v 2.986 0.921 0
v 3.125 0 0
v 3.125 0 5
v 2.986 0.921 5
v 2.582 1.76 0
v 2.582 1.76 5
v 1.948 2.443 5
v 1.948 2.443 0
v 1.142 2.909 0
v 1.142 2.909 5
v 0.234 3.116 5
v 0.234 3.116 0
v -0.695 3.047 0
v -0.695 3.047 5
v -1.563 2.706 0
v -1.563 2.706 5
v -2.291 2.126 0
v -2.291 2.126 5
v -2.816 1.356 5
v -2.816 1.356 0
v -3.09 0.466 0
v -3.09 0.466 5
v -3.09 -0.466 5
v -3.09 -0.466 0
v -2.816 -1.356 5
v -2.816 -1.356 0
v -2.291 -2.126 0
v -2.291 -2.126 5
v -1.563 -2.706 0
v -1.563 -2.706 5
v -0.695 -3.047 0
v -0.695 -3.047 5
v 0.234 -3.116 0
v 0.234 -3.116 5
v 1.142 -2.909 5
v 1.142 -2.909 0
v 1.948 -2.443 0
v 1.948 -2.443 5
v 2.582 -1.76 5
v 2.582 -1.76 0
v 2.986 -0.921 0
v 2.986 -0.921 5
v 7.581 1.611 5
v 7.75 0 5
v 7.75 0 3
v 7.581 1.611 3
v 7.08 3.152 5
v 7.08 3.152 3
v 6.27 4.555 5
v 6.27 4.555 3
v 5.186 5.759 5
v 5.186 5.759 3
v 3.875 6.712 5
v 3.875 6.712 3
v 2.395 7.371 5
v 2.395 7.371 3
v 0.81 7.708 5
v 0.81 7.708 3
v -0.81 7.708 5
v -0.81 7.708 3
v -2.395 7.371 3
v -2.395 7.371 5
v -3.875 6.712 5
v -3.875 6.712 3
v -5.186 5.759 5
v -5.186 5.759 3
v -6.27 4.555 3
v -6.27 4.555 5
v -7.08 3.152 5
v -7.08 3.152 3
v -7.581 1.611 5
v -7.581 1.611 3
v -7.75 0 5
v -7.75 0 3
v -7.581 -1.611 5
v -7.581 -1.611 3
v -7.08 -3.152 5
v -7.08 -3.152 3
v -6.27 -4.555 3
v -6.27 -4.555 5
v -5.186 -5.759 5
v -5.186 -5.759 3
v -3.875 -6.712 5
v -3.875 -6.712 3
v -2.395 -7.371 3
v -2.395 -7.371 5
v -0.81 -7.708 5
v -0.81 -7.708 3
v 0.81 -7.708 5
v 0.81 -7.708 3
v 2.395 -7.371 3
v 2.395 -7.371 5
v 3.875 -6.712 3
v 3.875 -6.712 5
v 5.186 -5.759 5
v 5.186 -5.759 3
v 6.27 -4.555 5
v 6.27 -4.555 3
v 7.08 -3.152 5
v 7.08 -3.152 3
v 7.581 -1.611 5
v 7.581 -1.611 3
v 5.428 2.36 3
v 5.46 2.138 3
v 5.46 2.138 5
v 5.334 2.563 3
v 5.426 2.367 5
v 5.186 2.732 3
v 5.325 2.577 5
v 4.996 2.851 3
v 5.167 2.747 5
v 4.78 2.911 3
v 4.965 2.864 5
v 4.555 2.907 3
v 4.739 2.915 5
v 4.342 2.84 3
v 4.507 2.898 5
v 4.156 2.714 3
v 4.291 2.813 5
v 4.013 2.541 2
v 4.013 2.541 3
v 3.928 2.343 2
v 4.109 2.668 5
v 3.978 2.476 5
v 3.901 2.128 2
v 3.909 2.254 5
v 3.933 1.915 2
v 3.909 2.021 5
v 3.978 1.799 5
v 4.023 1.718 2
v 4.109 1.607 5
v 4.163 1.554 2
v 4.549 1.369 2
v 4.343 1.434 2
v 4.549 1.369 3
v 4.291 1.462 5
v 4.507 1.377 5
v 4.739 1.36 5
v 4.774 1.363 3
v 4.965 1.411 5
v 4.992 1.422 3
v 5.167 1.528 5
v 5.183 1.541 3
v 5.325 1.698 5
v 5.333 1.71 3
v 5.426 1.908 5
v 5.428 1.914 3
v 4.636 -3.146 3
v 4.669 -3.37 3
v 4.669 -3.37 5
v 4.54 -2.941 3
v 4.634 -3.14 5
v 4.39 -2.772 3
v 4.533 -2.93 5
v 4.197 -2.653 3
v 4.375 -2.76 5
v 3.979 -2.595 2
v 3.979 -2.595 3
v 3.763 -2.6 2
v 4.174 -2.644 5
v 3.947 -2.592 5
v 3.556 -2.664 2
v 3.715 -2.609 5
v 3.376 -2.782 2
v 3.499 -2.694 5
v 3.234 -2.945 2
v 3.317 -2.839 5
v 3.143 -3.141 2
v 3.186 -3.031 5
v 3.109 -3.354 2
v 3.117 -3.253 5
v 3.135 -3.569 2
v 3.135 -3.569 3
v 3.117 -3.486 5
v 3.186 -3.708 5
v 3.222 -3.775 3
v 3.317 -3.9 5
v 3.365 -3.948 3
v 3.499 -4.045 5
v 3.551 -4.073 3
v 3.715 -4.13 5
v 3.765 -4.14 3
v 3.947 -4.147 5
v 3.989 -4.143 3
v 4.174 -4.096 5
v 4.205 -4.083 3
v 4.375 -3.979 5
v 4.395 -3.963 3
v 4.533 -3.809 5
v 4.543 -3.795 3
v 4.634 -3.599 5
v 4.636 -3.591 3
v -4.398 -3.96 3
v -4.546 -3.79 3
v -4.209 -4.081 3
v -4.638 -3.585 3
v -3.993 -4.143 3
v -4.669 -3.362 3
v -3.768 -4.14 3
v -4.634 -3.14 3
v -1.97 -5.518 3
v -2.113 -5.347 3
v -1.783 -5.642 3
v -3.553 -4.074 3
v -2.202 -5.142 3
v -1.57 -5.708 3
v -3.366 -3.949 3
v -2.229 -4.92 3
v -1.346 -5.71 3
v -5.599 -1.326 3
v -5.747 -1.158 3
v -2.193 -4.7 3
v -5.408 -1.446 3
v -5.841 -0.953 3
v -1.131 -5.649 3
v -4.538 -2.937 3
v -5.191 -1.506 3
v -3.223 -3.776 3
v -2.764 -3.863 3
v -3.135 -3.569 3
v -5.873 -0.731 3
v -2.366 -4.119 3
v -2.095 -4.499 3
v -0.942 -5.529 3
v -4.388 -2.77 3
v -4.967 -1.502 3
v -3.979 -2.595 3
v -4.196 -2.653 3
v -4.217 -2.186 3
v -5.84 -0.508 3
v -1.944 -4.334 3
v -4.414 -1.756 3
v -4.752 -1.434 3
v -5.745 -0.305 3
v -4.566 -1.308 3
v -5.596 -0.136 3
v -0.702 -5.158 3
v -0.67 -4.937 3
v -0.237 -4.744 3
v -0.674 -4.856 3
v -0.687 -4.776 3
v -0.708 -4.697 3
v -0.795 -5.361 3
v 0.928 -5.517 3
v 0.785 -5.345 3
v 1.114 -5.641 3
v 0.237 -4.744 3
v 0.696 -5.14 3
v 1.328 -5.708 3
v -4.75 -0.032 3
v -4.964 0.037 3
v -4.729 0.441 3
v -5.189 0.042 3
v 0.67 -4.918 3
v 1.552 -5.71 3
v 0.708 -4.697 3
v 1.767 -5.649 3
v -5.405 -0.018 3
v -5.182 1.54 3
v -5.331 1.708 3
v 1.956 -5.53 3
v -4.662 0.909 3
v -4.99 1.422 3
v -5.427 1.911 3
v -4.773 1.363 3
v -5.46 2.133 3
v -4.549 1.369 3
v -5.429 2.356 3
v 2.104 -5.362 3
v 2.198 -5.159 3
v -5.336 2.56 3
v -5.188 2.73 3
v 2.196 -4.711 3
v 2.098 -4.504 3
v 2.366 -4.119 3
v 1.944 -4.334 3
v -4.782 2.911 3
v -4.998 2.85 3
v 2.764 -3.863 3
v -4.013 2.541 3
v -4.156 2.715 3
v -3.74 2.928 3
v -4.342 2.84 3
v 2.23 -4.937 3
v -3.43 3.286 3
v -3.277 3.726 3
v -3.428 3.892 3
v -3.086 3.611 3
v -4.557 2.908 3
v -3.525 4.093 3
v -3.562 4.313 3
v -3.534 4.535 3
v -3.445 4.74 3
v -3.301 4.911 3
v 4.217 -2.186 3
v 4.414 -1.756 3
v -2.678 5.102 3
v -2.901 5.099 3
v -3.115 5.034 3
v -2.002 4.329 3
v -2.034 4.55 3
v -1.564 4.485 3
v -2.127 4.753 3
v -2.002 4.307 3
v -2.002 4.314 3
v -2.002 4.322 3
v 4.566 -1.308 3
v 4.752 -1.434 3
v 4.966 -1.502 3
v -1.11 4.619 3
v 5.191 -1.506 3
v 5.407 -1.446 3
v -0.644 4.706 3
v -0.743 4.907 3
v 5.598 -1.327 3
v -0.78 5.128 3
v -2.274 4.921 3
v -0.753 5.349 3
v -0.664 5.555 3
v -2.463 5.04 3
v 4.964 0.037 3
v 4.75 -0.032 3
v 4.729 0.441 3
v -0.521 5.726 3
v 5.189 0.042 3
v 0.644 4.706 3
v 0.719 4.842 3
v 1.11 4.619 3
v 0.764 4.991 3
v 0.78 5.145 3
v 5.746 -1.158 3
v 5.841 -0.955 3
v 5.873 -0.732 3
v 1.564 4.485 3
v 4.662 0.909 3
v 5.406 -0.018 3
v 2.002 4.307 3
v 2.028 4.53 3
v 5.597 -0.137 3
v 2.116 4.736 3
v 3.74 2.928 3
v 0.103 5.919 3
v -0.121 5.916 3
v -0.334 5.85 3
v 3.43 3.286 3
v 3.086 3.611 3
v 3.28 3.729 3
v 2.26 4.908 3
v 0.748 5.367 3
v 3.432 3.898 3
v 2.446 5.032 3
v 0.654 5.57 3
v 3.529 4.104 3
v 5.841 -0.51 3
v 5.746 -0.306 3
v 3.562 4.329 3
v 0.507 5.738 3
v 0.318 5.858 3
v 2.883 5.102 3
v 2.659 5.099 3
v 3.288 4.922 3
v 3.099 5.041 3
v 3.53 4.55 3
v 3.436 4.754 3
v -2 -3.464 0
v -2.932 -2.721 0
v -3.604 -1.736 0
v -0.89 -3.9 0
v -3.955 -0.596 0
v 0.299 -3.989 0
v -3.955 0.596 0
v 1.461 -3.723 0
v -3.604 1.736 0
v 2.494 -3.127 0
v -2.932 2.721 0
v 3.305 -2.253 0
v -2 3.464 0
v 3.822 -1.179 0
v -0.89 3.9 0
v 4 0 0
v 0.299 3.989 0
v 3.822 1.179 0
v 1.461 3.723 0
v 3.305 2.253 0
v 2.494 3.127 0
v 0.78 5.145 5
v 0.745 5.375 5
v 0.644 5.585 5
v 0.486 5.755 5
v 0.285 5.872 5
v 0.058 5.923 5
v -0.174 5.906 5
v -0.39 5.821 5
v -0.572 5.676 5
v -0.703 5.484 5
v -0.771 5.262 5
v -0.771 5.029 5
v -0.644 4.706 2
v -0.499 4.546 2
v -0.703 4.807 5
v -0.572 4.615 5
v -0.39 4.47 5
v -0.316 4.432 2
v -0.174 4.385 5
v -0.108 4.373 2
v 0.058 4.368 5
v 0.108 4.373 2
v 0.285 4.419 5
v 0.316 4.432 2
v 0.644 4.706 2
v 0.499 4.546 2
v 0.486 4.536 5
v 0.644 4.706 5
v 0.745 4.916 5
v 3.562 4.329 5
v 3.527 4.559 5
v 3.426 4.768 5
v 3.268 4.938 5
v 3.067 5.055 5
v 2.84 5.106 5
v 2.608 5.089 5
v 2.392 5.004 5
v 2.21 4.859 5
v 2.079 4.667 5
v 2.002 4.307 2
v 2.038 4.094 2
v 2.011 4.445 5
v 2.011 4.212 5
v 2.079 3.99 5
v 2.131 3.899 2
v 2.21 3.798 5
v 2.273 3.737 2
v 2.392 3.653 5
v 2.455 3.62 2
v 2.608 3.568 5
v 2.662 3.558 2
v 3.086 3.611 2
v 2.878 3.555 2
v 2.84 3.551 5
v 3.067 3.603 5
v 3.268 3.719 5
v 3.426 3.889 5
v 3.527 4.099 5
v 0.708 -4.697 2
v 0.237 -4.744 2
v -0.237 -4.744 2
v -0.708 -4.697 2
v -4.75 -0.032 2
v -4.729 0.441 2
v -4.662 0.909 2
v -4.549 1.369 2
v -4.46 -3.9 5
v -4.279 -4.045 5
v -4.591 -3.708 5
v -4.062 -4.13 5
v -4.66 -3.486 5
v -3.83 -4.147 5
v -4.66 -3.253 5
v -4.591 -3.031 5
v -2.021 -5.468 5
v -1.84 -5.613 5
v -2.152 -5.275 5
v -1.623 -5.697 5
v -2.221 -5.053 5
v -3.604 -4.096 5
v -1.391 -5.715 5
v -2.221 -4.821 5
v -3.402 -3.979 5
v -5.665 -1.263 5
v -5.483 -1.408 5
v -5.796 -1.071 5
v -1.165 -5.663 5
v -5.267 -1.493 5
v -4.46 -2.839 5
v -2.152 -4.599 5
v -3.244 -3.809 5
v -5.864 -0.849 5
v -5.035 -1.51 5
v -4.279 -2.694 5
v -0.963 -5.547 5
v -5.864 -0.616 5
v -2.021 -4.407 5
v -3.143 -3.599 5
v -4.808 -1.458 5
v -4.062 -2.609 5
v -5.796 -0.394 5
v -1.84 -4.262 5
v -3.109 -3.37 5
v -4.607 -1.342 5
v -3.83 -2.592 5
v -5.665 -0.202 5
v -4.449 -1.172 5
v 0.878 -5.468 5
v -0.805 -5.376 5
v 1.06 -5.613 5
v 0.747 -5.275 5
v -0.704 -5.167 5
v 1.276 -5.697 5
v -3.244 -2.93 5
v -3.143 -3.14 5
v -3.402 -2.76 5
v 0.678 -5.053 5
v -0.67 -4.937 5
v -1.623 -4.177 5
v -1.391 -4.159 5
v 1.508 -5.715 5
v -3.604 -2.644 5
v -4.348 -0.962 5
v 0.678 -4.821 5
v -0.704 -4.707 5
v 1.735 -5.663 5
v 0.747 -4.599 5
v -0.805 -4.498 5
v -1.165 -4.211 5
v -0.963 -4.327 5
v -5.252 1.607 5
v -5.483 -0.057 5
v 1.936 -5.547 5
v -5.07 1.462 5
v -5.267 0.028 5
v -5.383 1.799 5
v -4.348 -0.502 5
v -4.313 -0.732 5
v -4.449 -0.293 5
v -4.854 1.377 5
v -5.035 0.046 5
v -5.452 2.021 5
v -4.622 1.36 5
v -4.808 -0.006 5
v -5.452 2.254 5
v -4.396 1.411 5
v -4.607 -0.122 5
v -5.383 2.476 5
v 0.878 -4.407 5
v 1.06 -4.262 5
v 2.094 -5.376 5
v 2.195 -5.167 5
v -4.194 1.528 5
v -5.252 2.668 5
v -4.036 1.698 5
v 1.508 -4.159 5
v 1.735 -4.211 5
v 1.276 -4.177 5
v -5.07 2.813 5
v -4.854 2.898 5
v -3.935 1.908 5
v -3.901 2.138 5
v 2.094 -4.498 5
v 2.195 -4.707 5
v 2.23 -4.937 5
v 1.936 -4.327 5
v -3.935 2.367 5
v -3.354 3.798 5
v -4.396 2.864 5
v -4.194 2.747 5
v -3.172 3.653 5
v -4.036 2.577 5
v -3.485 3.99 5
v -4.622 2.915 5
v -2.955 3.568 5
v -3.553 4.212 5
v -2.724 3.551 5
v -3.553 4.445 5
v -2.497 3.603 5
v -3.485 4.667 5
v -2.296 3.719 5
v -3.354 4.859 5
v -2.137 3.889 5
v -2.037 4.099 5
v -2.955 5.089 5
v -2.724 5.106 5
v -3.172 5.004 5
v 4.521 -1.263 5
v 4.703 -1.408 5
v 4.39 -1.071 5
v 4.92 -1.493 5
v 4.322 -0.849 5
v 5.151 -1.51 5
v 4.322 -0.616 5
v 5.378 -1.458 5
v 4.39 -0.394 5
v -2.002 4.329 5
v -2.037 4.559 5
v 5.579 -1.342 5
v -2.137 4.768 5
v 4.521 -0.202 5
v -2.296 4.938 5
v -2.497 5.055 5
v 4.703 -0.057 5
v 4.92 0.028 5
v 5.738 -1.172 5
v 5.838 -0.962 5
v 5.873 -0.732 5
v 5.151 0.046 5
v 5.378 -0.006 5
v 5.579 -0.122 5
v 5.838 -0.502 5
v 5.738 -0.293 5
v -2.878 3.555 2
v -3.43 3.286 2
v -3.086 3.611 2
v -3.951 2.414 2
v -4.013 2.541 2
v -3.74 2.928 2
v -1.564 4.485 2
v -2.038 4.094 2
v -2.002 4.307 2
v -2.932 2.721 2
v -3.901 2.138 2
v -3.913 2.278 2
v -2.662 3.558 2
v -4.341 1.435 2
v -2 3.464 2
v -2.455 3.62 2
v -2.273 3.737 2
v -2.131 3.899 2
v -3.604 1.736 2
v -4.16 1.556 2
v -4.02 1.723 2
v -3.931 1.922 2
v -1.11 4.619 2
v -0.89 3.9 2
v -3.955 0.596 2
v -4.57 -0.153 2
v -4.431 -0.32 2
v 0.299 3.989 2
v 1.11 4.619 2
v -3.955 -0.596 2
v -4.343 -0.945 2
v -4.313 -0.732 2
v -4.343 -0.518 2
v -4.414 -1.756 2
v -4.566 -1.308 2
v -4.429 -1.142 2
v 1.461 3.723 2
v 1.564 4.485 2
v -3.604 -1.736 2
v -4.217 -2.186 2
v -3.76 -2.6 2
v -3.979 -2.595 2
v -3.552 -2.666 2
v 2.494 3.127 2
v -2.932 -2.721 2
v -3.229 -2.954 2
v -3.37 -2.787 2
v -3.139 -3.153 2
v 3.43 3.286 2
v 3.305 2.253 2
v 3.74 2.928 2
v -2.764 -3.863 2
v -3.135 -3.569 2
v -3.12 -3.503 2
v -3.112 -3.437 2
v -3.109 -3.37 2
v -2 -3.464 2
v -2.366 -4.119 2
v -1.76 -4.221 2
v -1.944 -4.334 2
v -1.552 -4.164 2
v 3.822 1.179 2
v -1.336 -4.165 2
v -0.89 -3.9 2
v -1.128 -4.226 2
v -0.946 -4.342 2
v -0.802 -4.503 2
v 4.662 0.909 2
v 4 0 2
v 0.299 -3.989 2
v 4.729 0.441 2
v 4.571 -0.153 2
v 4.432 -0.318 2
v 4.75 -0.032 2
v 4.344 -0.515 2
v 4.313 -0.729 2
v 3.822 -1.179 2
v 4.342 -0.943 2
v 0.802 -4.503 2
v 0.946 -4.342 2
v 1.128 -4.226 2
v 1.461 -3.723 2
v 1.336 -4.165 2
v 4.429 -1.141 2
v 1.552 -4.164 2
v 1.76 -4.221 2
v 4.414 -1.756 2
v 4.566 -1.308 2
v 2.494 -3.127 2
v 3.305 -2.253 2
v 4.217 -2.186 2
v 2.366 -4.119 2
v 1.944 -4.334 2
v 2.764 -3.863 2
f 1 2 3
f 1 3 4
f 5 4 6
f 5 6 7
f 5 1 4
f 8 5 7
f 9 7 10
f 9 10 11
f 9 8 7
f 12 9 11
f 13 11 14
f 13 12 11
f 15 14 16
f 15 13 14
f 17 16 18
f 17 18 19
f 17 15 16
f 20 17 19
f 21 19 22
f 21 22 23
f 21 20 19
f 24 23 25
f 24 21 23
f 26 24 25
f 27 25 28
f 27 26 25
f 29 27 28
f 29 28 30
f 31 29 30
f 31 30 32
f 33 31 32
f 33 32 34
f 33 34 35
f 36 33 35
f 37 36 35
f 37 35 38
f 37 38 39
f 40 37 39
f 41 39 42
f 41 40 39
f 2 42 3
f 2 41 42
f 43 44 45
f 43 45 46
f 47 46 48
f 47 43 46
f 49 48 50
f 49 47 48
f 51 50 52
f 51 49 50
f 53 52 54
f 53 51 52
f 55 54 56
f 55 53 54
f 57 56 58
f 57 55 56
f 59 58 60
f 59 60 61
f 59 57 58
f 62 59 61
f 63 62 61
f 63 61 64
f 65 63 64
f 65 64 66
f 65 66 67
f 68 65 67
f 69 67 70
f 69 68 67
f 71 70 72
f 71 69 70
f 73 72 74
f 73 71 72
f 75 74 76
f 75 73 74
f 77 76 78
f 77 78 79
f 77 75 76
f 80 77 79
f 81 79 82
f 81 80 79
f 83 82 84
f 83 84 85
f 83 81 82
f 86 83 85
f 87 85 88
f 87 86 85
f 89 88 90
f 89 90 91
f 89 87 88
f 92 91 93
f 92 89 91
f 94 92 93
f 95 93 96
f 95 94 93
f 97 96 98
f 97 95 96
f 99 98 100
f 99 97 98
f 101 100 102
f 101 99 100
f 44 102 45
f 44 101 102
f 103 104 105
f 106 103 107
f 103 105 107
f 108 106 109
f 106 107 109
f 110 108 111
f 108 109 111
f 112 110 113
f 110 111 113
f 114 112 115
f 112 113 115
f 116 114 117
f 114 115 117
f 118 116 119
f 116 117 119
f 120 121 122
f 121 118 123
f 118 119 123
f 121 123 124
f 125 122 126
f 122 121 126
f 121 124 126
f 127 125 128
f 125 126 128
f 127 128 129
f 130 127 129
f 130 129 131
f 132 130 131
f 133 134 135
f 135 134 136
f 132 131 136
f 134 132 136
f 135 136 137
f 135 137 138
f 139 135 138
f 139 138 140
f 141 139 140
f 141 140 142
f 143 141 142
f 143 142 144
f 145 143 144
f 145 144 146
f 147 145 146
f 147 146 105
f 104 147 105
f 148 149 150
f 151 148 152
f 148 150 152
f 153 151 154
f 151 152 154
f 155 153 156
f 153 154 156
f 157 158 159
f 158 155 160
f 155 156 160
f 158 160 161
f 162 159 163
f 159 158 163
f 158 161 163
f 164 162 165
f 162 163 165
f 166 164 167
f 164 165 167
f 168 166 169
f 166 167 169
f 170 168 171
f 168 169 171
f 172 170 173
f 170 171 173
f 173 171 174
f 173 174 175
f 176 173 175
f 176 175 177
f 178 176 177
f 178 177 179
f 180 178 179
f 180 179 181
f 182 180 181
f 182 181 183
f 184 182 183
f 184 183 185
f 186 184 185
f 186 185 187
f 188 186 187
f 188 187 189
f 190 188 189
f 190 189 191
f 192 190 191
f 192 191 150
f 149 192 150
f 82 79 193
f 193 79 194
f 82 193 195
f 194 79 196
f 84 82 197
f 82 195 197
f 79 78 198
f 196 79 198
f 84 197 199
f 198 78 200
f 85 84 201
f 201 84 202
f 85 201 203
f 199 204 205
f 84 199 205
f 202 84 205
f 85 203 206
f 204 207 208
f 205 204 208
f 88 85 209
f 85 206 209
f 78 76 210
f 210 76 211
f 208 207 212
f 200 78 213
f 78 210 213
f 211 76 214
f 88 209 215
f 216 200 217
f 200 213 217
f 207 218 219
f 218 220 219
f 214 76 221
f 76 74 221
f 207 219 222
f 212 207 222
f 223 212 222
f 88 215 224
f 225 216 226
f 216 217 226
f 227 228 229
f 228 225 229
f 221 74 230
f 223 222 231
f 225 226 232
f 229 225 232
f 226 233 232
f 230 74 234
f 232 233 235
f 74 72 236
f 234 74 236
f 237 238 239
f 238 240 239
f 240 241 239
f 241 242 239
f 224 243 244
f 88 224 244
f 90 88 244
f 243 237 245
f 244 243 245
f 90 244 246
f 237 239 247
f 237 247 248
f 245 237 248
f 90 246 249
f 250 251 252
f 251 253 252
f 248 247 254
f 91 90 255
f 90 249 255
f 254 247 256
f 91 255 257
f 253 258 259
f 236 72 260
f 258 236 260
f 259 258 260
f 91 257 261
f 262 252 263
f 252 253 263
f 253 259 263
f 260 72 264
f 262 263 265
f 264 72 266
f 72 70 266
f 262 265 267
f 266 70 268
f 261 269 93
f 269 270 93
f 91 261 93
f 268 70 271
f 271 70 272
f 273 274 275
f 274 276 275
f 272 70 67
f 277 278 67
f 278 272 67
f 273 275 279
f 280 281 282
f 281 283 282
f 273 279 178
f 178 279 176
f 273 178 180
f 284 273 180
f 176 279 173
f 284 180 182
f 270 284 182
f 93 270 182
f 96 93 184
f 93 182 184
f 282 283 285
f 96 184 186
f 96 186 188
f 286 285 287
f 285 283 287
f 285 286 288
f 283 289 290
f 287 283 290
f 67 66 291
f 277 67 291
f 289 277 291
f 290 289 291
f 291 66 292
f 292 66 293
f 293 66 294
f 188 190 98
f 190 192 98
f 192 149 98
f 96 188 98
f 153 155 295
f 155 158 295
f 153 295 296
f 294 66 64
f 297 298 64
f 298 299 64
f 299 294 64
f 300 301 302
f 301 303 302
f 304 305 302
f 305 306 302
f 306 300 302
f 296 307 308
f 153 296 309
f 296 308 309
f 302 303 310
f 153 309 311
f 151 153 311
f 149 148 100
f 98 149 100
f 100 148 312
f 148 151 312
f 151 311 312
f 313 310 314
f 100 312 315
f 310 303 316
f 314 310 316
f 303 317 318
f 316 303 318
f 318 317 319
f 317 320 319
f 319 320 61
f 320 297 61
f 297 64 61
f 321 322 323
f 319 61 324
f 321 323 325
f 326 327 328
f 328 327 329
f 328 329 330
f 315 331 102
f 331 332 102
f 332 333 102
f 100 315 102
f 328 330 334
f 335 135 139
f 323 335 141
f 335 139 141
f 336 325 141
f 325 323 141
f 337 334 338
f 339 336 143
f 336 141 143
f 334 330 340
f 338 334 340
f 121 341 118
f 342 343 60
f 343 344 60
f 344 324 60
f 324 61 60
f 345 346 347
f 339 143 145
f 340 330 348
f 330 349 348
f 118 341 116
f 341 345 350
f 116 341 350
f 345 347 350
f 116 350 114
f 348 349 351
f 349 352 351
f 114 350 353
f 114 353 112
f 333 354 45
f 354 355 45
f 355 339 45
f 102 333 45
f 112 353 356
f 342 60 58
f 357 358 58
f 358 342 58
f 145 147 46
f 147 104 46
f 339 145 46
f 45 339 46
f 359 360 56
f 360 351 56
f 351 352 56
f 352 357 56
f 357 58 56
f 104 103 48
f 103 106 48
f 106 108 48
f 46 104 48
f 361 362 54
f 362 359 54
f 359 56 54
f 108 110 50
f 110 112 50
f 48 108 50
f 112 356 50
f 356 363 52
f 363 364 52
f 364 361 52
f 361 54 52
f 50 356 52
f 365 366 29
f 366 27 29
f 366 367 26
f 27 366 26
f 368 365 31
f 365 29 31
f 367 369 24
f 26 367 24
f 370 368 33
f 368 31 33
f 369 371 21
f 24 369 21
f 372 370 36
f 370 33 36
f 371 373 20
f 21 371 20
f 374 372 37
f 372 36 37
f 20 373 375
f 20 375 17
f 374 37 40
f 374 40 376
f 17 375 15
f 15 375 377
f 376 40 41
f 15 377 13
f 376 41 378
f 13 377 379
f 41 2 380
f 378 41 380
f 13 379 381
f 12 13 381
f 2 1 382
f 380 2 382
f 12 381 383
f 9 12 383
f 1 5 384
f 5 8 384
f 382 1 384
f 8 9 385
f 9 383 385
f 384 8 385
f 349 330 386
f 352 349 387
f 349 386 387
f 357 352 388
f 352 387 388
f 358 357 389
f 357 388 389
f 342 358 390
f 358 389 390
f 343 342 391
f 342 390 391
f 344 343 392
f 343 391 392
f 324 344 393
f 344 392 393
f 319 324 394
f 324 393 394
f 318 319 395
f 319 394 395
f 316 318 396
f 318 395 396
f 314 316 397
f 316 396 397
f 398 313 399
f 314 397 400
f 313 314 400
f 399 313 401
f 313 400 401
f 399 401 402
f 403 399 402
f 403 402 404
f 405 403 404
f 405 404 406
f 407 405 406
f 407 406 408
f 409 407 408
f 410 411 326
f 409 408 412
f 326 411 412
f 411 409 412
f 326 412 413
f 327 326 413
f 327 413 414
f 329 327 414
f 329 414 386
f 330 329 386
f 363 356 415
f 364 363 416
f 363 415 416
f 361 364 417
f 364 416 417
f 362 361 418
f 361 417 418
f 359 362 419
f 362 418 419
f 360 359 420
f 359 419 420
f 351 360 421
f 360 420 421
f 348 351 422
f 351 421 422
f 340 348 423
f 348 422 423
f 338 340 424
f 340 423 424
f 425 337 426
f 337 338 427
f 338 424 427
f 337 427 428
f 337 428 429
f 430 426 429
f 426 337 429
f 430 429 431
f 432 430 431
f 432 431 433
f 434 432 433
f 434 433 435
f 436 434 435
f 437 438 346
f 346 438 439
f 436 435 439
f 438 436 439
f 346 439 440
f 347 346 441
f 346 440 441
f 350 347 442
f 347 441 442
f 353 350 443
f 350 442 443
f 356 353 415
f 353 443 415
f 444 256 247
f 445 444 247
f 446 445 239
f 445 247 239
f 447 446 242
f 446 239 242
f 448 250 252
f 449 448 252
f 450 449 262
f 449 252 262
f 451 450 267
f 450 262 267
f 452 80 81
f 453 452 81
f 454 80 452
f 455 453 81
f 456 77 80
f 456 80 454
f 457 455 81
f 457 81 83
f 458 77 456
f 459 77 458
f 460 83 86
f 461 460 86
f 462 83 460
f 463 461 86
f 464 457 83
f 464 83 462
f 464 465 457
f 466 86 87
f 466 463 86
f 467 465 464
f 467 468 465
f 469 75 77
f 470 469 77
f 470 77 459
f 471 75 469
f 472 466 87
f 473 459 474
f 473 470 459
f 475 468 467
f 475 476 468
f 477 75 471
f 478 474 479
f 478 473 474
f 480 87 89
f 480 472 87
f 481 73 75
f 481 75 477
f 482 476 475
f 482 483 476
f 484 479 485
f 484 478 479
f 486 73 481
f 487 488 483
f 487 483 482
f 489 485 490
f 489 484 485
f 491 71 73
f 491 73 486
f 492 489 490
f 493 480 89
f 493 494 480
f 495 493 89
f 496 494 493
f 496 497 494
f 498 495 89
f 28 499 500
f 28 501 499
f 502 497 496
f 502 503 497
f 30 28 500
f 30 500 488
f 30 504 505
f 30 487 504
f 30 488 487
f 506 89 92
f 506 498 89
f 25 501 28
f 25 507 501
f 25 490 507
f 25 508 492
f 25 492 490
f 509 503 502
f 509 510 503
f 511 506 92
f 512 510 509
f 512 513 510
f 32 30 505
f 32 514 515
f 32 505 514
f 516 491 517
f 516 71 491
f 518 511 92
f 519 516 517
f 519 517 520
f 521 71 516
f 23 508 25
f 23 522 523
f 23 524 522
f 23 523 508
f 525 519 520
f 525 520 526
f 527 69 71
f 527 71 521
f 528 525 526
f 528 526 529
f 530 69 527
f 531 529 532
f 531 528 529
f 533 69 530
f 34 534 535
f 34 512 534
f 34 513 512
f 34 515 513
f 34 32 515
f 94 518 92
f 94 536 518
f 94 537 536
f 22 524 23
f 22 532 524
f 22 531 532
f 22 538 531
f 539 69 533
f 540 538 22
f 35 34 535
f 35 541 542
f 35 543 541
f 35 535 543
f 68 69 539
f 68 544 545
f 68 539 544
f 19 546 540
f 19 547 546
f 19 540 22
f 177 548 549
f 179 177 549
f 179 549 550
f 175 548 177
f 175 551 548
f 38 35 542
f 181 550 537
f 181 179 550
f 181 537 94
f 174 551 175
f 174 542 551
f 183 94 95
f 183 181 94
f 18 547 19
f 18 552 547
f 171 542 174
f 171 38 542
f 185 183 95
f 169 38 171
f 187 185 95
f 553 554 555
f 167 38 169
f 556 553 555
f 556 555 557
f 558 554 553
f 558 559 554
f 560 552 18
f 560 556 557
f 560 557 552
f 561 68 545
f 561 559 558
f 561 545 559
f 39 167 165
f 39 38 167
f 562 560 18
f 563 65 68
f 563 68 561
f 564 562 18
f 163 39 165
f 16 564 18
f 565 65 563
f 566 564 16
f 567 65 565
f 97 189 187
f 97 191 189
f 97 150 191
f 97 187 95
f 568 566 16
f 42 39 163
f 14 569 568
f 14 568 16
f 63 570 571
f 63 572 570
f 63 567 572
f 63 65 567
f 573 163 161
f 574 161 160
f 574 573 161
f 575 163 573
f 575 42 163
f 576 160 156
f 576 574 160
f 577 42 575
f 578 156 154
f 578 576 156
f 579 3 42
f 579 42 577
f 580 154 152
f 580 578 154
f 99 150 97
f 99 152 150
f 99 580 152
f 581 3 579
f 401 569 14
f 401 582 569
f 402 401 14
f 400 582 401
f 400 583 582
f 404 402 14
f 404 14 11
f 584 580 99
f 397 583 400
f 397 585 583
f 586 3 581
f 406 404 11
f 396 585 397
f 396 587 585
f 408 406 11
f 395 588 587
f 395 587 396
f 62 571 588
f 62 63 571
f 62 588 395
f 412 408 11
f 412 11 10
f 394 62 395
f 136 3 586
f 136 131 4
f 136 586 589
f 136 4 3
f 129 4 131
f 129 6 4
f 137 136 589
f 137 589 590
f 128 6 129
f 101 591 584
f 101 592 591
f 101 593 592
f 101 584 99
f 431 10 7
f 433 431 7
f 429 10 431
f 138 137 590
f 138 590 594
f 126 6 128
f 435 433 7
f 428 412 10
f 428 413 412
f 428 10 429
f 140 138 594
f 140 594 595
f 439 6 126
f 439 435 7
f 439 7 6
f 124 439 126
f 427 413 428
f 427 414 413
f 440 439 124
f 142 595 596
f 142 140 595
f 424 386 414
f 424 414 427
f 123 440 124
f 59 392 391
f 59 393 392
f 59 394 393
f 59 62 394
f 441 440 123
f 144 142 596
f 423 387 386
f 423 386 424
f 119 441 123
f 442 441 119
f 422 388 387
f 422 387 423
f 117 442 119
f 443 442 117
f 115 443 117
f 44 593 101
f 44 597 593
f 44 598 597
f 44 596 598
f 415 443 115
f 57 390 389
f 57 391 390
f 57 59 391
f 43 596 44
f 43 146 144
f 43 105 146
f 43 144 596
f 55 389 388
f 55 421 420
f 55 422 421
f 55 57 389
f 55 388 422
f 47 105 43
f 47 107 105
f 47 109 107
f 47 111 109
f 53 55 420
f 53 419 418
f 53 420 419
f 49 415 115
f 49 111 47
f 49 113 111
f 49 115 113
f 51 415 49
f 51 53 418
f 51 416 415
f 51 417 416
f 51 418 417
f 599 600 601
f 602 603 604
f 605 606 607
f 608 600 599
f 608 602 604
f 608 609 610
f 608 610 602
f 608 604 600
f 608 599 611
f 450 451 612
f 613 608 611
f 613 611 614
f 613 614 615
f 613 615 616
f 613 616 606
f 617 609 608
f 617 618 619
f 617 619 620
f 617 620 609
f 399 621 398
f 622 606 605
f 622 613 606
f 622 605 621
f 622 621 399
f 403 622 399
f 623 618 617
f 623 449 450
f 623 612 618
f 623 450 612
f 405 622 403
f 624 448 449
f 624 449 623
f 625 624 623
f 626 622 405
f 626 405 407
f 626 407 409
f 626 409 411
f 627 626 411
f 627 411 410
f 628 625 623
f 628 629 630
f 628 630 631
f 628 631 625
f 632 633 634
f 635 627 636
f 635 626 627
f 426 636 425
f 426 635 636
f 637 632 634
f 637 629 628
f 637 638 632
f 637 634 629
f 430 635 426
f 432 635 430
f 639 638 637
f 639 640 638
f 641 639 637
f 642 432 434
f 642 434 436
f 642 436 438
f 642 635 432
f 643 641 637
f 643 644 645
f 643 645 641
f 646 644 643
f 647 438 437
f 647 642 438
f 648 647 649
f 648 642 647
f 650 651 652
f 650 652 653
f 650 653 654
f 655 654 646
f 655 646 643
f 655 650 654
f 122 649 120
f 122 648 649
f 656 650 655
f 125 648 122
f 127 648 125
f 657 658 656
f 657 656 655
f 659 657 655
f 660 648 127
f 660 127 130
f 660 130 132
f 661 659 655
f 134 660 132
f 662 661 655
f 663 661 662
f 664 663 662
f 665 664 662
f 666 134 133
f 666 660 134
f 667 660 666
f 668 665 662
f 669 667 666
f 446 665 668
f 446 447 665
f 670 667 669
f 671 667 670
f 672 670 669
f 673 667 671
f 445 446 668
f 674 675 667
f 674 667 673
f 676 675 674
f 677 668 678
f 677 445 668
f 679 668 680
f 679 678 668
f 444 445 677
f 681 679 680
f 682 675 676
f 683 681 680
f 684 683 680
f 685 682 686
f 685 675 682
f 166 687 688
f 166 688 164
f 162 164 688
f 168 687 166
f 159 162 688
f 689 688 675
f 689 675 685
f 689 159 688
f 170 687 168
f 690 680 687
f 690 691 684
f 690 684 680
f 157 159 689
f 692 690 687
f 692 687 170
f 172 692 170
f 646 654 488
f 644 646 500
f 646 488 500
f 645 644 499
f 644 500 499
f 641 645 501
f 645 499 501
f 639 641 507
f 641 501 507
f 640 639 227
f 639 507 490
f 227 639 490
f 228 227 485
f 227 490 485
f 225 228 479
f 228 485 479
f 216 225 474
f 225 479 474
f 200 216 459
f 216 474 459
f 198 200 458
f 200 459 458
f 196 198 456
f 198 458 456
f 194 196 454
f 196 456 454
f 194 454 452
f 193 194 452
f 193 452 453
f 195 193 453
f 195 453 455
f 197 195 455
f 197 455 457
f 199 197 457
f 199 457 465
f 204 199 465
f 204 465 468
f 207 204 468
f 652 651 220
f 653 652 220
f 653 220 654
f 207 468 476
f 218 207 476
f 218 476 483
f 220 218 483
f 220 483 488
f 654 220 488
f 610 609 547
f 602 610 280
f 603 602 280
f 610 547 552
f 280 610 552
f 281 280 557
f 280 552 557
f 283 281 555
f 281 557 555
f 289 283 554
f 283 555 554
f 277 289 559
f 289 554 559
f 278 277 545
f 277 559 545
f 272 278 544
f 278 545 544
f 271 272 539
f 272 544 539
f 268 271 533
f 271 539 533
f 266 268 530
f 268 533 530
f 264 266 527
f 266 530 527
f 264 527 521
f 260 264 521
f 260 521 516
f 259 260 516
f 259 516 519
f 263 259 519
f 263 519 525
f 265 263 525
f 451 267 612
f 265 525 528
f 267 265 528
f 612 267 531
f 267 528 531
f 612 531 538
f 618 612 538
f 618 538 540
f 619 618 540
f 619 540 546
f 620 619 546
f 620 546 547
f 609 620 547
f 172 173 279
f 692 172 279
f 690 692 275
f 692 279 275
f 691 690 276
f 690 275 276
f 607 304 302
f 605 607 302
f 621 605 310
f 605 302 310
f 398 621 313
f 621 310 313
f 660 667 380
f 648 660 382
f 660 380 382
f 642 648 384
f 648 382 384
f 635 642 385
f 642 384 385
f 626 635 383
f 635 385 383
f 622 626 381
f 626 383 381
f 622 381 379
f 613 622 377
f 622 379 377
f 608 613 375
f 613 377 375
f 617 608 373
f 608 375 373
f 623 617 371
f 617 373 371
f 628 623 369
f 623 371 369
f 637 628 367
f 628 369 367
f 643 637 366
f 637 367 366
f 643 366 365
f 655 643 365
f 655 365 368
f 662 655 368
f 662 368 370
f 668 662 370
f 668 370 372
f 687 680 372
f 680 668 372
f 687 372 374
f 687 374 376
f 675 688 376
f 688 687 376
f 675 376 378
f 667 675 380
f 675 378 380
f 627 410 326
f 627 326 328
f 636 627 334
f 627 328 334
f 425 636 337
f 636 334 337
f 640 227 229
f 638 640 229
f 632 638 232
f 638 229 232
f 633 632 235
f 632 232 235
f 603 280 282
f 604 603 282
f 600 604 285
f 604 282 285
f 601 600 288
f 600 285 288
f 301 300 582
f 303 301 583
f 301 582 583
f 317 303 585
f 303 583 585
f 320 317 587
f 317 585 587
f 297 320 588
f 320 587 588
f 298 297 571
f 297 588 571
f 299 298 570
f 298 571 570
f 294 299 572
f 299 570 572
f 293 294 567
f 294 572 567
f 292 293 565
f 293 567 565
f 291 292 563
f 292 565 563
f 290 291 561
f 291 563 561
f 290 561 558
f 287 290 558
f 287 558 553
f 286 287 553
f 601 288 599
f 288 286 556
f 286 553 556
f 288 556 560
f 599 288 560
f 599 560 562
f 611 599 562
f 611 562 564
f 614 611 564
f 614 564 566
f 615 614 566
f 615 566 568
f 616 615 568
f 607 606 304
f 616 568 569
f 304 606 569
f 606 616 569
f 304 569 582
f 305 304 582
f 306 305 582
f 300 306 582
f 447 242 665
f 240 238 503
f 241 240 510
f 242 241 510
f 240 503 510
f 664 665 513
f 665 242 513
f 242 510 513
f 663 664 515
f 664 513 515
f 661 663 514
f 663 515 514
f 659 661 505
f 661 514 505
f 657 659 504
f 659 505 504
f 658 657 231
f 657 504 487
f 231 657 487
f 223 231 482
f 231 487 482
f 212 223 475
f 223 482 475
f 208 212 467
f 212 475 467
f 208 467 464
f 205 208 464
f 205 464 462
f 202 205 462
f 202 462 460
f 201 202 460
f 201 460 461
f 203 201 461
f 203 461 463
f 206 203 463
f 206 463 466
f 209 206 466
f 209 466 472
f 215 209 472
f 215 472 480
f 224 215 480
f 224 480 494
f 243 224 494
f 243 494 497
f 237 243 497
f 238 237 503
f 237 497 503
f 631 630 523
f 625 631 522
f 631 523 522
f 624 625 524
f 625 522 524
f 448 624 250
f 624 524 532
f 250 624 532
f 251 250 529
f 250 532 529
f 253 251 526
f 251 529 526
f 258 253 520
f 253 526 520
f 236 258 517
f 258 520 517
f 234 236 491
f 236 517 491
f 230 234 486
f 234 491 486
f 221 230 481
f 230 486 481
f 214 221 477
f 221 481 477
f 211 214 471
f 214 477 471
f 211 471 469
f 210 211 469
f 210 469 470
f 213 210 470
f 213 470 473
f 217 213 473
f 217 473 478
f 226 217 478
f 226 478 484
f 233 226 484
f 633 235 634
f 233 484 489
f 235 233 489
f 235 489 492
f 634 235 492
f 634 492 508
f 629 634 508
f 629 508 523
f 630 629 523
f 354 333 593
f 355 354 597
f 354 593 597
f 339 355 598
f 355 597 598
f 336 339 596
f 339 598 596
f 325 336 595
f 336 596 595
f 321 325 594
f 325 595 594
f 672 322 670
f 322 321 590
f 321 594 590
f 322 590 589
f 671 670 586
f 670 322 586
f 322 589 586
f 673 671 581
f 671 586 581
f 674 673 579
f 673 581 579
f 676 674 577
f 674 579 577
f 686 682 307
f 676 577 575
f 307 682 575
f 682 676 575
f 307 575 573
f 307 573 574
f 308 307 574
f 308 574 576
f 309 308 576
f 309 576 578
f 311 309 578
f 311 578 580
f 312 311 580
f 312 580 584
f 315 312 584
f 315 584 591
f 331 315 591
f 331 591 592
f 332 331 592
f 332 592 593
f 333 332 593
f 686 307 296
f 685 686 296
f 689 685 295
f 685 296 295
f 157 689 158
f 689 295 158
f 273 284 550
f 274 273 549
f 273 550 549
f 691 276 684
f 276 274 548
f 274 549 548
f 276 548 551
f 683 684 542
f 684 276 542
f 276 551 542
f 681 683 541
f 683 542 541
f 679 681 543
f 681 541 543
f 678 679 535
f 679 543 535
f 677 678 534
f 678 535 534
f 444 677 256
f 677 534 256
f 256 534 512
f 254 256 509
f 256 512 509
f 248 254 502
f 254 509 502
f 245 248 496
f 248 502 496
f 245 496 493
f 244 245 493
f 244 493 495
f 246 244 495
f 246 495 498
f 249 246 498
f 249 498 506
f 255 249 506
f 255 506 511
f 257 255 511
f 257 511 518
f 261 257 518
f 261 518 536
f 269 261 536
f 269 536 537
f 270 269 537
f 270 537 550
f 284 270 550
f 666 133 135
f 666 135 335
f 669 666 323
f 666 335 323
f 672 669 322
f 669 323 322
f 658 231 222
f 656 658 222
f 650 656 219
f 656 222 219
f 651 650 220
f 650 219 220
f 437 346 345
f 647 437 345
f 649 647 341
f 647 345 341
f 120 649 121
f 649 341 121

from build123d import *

# Parameters (mm, degrees)
F0_R     = 4
F0_R_2   = 3.125
F1_DEPTH = 5
F2_R     = 7.75
F2_R_2   = 4
F3_DEPTH = 2
F4_R     = 4.75
F4_R_2   = 4
F5_DEPTH = 1
F6_R     = 0.7799623088
F7_DEPTH = 12.7


with BuildPart() as f1:
    # F0 (on Top) → F1 (new body)
    with BuildSketch(Plane.XY):
        Circle(F0_R)
        Circle(F0_R_2, mode=Mode.SUBTRACT)
    extrude(amount=F1_DEPTH)

    # F2 (on face) → F3 (join)
    with BuildSketch(Plane.XY.offset(5)):
        Circle(F2_R)
        Circle(F2_R_2, mode=Mode.SUBTRACT)
    extrude(amount=-F3_DEPTH)

    # F4 (on face) → F5 (join)
    with BuildSketch(Plane(origin=(0, 0, 3), x_dir=(1, 0, 0), z_dir=(0, 0, -1))):
        Circle(F4_R)
        Circle(F4_R_2, mode=Mode.SUBTRACT)
    extrude(amount=F5_DEPTH)

    # F6 (on face) → F7 (cut, symmetric)
    with BuildSketch(Plane.XY.offset(5)):
        with Locations((0, 5.1454929635)):
            Circle(F6_R)
        with Locations((-2.781863522, 4.3286641337)):
            Circle(F6_R)
        with Locations((-4.6805050315, 2.1375150263)):
            Circle(F6_R)
        with Locations((-5.0931192643, -0.7322799989)):
            Circle(F6_R)
        with Locations((-3.888704117, -3.3695812986)):
            Circle(F6_R)
        with Locations((-1.4496528888, -4.9370643443)):
            Circle(F6_R)
        with Locations((1.4496528888, -4.9370643443)):
            Circle(F6_R)
        with Locations((3.888704117, -3.3695812986)):
            Circle(F6_R)
        with Locations((5.0931192643, -0.7322799989)):
            Circle(F6_R)
        with Locations((4.6805050315, 2.1375150263)):
            Circle(F6_R)
        with Locations((2.781863522, 4.3286641337)):
            Circle(F6_R)
    extrude(amount=F7_DEPTH, both=True, mode=Mode.SUBTRACT)


solid = f1.part
